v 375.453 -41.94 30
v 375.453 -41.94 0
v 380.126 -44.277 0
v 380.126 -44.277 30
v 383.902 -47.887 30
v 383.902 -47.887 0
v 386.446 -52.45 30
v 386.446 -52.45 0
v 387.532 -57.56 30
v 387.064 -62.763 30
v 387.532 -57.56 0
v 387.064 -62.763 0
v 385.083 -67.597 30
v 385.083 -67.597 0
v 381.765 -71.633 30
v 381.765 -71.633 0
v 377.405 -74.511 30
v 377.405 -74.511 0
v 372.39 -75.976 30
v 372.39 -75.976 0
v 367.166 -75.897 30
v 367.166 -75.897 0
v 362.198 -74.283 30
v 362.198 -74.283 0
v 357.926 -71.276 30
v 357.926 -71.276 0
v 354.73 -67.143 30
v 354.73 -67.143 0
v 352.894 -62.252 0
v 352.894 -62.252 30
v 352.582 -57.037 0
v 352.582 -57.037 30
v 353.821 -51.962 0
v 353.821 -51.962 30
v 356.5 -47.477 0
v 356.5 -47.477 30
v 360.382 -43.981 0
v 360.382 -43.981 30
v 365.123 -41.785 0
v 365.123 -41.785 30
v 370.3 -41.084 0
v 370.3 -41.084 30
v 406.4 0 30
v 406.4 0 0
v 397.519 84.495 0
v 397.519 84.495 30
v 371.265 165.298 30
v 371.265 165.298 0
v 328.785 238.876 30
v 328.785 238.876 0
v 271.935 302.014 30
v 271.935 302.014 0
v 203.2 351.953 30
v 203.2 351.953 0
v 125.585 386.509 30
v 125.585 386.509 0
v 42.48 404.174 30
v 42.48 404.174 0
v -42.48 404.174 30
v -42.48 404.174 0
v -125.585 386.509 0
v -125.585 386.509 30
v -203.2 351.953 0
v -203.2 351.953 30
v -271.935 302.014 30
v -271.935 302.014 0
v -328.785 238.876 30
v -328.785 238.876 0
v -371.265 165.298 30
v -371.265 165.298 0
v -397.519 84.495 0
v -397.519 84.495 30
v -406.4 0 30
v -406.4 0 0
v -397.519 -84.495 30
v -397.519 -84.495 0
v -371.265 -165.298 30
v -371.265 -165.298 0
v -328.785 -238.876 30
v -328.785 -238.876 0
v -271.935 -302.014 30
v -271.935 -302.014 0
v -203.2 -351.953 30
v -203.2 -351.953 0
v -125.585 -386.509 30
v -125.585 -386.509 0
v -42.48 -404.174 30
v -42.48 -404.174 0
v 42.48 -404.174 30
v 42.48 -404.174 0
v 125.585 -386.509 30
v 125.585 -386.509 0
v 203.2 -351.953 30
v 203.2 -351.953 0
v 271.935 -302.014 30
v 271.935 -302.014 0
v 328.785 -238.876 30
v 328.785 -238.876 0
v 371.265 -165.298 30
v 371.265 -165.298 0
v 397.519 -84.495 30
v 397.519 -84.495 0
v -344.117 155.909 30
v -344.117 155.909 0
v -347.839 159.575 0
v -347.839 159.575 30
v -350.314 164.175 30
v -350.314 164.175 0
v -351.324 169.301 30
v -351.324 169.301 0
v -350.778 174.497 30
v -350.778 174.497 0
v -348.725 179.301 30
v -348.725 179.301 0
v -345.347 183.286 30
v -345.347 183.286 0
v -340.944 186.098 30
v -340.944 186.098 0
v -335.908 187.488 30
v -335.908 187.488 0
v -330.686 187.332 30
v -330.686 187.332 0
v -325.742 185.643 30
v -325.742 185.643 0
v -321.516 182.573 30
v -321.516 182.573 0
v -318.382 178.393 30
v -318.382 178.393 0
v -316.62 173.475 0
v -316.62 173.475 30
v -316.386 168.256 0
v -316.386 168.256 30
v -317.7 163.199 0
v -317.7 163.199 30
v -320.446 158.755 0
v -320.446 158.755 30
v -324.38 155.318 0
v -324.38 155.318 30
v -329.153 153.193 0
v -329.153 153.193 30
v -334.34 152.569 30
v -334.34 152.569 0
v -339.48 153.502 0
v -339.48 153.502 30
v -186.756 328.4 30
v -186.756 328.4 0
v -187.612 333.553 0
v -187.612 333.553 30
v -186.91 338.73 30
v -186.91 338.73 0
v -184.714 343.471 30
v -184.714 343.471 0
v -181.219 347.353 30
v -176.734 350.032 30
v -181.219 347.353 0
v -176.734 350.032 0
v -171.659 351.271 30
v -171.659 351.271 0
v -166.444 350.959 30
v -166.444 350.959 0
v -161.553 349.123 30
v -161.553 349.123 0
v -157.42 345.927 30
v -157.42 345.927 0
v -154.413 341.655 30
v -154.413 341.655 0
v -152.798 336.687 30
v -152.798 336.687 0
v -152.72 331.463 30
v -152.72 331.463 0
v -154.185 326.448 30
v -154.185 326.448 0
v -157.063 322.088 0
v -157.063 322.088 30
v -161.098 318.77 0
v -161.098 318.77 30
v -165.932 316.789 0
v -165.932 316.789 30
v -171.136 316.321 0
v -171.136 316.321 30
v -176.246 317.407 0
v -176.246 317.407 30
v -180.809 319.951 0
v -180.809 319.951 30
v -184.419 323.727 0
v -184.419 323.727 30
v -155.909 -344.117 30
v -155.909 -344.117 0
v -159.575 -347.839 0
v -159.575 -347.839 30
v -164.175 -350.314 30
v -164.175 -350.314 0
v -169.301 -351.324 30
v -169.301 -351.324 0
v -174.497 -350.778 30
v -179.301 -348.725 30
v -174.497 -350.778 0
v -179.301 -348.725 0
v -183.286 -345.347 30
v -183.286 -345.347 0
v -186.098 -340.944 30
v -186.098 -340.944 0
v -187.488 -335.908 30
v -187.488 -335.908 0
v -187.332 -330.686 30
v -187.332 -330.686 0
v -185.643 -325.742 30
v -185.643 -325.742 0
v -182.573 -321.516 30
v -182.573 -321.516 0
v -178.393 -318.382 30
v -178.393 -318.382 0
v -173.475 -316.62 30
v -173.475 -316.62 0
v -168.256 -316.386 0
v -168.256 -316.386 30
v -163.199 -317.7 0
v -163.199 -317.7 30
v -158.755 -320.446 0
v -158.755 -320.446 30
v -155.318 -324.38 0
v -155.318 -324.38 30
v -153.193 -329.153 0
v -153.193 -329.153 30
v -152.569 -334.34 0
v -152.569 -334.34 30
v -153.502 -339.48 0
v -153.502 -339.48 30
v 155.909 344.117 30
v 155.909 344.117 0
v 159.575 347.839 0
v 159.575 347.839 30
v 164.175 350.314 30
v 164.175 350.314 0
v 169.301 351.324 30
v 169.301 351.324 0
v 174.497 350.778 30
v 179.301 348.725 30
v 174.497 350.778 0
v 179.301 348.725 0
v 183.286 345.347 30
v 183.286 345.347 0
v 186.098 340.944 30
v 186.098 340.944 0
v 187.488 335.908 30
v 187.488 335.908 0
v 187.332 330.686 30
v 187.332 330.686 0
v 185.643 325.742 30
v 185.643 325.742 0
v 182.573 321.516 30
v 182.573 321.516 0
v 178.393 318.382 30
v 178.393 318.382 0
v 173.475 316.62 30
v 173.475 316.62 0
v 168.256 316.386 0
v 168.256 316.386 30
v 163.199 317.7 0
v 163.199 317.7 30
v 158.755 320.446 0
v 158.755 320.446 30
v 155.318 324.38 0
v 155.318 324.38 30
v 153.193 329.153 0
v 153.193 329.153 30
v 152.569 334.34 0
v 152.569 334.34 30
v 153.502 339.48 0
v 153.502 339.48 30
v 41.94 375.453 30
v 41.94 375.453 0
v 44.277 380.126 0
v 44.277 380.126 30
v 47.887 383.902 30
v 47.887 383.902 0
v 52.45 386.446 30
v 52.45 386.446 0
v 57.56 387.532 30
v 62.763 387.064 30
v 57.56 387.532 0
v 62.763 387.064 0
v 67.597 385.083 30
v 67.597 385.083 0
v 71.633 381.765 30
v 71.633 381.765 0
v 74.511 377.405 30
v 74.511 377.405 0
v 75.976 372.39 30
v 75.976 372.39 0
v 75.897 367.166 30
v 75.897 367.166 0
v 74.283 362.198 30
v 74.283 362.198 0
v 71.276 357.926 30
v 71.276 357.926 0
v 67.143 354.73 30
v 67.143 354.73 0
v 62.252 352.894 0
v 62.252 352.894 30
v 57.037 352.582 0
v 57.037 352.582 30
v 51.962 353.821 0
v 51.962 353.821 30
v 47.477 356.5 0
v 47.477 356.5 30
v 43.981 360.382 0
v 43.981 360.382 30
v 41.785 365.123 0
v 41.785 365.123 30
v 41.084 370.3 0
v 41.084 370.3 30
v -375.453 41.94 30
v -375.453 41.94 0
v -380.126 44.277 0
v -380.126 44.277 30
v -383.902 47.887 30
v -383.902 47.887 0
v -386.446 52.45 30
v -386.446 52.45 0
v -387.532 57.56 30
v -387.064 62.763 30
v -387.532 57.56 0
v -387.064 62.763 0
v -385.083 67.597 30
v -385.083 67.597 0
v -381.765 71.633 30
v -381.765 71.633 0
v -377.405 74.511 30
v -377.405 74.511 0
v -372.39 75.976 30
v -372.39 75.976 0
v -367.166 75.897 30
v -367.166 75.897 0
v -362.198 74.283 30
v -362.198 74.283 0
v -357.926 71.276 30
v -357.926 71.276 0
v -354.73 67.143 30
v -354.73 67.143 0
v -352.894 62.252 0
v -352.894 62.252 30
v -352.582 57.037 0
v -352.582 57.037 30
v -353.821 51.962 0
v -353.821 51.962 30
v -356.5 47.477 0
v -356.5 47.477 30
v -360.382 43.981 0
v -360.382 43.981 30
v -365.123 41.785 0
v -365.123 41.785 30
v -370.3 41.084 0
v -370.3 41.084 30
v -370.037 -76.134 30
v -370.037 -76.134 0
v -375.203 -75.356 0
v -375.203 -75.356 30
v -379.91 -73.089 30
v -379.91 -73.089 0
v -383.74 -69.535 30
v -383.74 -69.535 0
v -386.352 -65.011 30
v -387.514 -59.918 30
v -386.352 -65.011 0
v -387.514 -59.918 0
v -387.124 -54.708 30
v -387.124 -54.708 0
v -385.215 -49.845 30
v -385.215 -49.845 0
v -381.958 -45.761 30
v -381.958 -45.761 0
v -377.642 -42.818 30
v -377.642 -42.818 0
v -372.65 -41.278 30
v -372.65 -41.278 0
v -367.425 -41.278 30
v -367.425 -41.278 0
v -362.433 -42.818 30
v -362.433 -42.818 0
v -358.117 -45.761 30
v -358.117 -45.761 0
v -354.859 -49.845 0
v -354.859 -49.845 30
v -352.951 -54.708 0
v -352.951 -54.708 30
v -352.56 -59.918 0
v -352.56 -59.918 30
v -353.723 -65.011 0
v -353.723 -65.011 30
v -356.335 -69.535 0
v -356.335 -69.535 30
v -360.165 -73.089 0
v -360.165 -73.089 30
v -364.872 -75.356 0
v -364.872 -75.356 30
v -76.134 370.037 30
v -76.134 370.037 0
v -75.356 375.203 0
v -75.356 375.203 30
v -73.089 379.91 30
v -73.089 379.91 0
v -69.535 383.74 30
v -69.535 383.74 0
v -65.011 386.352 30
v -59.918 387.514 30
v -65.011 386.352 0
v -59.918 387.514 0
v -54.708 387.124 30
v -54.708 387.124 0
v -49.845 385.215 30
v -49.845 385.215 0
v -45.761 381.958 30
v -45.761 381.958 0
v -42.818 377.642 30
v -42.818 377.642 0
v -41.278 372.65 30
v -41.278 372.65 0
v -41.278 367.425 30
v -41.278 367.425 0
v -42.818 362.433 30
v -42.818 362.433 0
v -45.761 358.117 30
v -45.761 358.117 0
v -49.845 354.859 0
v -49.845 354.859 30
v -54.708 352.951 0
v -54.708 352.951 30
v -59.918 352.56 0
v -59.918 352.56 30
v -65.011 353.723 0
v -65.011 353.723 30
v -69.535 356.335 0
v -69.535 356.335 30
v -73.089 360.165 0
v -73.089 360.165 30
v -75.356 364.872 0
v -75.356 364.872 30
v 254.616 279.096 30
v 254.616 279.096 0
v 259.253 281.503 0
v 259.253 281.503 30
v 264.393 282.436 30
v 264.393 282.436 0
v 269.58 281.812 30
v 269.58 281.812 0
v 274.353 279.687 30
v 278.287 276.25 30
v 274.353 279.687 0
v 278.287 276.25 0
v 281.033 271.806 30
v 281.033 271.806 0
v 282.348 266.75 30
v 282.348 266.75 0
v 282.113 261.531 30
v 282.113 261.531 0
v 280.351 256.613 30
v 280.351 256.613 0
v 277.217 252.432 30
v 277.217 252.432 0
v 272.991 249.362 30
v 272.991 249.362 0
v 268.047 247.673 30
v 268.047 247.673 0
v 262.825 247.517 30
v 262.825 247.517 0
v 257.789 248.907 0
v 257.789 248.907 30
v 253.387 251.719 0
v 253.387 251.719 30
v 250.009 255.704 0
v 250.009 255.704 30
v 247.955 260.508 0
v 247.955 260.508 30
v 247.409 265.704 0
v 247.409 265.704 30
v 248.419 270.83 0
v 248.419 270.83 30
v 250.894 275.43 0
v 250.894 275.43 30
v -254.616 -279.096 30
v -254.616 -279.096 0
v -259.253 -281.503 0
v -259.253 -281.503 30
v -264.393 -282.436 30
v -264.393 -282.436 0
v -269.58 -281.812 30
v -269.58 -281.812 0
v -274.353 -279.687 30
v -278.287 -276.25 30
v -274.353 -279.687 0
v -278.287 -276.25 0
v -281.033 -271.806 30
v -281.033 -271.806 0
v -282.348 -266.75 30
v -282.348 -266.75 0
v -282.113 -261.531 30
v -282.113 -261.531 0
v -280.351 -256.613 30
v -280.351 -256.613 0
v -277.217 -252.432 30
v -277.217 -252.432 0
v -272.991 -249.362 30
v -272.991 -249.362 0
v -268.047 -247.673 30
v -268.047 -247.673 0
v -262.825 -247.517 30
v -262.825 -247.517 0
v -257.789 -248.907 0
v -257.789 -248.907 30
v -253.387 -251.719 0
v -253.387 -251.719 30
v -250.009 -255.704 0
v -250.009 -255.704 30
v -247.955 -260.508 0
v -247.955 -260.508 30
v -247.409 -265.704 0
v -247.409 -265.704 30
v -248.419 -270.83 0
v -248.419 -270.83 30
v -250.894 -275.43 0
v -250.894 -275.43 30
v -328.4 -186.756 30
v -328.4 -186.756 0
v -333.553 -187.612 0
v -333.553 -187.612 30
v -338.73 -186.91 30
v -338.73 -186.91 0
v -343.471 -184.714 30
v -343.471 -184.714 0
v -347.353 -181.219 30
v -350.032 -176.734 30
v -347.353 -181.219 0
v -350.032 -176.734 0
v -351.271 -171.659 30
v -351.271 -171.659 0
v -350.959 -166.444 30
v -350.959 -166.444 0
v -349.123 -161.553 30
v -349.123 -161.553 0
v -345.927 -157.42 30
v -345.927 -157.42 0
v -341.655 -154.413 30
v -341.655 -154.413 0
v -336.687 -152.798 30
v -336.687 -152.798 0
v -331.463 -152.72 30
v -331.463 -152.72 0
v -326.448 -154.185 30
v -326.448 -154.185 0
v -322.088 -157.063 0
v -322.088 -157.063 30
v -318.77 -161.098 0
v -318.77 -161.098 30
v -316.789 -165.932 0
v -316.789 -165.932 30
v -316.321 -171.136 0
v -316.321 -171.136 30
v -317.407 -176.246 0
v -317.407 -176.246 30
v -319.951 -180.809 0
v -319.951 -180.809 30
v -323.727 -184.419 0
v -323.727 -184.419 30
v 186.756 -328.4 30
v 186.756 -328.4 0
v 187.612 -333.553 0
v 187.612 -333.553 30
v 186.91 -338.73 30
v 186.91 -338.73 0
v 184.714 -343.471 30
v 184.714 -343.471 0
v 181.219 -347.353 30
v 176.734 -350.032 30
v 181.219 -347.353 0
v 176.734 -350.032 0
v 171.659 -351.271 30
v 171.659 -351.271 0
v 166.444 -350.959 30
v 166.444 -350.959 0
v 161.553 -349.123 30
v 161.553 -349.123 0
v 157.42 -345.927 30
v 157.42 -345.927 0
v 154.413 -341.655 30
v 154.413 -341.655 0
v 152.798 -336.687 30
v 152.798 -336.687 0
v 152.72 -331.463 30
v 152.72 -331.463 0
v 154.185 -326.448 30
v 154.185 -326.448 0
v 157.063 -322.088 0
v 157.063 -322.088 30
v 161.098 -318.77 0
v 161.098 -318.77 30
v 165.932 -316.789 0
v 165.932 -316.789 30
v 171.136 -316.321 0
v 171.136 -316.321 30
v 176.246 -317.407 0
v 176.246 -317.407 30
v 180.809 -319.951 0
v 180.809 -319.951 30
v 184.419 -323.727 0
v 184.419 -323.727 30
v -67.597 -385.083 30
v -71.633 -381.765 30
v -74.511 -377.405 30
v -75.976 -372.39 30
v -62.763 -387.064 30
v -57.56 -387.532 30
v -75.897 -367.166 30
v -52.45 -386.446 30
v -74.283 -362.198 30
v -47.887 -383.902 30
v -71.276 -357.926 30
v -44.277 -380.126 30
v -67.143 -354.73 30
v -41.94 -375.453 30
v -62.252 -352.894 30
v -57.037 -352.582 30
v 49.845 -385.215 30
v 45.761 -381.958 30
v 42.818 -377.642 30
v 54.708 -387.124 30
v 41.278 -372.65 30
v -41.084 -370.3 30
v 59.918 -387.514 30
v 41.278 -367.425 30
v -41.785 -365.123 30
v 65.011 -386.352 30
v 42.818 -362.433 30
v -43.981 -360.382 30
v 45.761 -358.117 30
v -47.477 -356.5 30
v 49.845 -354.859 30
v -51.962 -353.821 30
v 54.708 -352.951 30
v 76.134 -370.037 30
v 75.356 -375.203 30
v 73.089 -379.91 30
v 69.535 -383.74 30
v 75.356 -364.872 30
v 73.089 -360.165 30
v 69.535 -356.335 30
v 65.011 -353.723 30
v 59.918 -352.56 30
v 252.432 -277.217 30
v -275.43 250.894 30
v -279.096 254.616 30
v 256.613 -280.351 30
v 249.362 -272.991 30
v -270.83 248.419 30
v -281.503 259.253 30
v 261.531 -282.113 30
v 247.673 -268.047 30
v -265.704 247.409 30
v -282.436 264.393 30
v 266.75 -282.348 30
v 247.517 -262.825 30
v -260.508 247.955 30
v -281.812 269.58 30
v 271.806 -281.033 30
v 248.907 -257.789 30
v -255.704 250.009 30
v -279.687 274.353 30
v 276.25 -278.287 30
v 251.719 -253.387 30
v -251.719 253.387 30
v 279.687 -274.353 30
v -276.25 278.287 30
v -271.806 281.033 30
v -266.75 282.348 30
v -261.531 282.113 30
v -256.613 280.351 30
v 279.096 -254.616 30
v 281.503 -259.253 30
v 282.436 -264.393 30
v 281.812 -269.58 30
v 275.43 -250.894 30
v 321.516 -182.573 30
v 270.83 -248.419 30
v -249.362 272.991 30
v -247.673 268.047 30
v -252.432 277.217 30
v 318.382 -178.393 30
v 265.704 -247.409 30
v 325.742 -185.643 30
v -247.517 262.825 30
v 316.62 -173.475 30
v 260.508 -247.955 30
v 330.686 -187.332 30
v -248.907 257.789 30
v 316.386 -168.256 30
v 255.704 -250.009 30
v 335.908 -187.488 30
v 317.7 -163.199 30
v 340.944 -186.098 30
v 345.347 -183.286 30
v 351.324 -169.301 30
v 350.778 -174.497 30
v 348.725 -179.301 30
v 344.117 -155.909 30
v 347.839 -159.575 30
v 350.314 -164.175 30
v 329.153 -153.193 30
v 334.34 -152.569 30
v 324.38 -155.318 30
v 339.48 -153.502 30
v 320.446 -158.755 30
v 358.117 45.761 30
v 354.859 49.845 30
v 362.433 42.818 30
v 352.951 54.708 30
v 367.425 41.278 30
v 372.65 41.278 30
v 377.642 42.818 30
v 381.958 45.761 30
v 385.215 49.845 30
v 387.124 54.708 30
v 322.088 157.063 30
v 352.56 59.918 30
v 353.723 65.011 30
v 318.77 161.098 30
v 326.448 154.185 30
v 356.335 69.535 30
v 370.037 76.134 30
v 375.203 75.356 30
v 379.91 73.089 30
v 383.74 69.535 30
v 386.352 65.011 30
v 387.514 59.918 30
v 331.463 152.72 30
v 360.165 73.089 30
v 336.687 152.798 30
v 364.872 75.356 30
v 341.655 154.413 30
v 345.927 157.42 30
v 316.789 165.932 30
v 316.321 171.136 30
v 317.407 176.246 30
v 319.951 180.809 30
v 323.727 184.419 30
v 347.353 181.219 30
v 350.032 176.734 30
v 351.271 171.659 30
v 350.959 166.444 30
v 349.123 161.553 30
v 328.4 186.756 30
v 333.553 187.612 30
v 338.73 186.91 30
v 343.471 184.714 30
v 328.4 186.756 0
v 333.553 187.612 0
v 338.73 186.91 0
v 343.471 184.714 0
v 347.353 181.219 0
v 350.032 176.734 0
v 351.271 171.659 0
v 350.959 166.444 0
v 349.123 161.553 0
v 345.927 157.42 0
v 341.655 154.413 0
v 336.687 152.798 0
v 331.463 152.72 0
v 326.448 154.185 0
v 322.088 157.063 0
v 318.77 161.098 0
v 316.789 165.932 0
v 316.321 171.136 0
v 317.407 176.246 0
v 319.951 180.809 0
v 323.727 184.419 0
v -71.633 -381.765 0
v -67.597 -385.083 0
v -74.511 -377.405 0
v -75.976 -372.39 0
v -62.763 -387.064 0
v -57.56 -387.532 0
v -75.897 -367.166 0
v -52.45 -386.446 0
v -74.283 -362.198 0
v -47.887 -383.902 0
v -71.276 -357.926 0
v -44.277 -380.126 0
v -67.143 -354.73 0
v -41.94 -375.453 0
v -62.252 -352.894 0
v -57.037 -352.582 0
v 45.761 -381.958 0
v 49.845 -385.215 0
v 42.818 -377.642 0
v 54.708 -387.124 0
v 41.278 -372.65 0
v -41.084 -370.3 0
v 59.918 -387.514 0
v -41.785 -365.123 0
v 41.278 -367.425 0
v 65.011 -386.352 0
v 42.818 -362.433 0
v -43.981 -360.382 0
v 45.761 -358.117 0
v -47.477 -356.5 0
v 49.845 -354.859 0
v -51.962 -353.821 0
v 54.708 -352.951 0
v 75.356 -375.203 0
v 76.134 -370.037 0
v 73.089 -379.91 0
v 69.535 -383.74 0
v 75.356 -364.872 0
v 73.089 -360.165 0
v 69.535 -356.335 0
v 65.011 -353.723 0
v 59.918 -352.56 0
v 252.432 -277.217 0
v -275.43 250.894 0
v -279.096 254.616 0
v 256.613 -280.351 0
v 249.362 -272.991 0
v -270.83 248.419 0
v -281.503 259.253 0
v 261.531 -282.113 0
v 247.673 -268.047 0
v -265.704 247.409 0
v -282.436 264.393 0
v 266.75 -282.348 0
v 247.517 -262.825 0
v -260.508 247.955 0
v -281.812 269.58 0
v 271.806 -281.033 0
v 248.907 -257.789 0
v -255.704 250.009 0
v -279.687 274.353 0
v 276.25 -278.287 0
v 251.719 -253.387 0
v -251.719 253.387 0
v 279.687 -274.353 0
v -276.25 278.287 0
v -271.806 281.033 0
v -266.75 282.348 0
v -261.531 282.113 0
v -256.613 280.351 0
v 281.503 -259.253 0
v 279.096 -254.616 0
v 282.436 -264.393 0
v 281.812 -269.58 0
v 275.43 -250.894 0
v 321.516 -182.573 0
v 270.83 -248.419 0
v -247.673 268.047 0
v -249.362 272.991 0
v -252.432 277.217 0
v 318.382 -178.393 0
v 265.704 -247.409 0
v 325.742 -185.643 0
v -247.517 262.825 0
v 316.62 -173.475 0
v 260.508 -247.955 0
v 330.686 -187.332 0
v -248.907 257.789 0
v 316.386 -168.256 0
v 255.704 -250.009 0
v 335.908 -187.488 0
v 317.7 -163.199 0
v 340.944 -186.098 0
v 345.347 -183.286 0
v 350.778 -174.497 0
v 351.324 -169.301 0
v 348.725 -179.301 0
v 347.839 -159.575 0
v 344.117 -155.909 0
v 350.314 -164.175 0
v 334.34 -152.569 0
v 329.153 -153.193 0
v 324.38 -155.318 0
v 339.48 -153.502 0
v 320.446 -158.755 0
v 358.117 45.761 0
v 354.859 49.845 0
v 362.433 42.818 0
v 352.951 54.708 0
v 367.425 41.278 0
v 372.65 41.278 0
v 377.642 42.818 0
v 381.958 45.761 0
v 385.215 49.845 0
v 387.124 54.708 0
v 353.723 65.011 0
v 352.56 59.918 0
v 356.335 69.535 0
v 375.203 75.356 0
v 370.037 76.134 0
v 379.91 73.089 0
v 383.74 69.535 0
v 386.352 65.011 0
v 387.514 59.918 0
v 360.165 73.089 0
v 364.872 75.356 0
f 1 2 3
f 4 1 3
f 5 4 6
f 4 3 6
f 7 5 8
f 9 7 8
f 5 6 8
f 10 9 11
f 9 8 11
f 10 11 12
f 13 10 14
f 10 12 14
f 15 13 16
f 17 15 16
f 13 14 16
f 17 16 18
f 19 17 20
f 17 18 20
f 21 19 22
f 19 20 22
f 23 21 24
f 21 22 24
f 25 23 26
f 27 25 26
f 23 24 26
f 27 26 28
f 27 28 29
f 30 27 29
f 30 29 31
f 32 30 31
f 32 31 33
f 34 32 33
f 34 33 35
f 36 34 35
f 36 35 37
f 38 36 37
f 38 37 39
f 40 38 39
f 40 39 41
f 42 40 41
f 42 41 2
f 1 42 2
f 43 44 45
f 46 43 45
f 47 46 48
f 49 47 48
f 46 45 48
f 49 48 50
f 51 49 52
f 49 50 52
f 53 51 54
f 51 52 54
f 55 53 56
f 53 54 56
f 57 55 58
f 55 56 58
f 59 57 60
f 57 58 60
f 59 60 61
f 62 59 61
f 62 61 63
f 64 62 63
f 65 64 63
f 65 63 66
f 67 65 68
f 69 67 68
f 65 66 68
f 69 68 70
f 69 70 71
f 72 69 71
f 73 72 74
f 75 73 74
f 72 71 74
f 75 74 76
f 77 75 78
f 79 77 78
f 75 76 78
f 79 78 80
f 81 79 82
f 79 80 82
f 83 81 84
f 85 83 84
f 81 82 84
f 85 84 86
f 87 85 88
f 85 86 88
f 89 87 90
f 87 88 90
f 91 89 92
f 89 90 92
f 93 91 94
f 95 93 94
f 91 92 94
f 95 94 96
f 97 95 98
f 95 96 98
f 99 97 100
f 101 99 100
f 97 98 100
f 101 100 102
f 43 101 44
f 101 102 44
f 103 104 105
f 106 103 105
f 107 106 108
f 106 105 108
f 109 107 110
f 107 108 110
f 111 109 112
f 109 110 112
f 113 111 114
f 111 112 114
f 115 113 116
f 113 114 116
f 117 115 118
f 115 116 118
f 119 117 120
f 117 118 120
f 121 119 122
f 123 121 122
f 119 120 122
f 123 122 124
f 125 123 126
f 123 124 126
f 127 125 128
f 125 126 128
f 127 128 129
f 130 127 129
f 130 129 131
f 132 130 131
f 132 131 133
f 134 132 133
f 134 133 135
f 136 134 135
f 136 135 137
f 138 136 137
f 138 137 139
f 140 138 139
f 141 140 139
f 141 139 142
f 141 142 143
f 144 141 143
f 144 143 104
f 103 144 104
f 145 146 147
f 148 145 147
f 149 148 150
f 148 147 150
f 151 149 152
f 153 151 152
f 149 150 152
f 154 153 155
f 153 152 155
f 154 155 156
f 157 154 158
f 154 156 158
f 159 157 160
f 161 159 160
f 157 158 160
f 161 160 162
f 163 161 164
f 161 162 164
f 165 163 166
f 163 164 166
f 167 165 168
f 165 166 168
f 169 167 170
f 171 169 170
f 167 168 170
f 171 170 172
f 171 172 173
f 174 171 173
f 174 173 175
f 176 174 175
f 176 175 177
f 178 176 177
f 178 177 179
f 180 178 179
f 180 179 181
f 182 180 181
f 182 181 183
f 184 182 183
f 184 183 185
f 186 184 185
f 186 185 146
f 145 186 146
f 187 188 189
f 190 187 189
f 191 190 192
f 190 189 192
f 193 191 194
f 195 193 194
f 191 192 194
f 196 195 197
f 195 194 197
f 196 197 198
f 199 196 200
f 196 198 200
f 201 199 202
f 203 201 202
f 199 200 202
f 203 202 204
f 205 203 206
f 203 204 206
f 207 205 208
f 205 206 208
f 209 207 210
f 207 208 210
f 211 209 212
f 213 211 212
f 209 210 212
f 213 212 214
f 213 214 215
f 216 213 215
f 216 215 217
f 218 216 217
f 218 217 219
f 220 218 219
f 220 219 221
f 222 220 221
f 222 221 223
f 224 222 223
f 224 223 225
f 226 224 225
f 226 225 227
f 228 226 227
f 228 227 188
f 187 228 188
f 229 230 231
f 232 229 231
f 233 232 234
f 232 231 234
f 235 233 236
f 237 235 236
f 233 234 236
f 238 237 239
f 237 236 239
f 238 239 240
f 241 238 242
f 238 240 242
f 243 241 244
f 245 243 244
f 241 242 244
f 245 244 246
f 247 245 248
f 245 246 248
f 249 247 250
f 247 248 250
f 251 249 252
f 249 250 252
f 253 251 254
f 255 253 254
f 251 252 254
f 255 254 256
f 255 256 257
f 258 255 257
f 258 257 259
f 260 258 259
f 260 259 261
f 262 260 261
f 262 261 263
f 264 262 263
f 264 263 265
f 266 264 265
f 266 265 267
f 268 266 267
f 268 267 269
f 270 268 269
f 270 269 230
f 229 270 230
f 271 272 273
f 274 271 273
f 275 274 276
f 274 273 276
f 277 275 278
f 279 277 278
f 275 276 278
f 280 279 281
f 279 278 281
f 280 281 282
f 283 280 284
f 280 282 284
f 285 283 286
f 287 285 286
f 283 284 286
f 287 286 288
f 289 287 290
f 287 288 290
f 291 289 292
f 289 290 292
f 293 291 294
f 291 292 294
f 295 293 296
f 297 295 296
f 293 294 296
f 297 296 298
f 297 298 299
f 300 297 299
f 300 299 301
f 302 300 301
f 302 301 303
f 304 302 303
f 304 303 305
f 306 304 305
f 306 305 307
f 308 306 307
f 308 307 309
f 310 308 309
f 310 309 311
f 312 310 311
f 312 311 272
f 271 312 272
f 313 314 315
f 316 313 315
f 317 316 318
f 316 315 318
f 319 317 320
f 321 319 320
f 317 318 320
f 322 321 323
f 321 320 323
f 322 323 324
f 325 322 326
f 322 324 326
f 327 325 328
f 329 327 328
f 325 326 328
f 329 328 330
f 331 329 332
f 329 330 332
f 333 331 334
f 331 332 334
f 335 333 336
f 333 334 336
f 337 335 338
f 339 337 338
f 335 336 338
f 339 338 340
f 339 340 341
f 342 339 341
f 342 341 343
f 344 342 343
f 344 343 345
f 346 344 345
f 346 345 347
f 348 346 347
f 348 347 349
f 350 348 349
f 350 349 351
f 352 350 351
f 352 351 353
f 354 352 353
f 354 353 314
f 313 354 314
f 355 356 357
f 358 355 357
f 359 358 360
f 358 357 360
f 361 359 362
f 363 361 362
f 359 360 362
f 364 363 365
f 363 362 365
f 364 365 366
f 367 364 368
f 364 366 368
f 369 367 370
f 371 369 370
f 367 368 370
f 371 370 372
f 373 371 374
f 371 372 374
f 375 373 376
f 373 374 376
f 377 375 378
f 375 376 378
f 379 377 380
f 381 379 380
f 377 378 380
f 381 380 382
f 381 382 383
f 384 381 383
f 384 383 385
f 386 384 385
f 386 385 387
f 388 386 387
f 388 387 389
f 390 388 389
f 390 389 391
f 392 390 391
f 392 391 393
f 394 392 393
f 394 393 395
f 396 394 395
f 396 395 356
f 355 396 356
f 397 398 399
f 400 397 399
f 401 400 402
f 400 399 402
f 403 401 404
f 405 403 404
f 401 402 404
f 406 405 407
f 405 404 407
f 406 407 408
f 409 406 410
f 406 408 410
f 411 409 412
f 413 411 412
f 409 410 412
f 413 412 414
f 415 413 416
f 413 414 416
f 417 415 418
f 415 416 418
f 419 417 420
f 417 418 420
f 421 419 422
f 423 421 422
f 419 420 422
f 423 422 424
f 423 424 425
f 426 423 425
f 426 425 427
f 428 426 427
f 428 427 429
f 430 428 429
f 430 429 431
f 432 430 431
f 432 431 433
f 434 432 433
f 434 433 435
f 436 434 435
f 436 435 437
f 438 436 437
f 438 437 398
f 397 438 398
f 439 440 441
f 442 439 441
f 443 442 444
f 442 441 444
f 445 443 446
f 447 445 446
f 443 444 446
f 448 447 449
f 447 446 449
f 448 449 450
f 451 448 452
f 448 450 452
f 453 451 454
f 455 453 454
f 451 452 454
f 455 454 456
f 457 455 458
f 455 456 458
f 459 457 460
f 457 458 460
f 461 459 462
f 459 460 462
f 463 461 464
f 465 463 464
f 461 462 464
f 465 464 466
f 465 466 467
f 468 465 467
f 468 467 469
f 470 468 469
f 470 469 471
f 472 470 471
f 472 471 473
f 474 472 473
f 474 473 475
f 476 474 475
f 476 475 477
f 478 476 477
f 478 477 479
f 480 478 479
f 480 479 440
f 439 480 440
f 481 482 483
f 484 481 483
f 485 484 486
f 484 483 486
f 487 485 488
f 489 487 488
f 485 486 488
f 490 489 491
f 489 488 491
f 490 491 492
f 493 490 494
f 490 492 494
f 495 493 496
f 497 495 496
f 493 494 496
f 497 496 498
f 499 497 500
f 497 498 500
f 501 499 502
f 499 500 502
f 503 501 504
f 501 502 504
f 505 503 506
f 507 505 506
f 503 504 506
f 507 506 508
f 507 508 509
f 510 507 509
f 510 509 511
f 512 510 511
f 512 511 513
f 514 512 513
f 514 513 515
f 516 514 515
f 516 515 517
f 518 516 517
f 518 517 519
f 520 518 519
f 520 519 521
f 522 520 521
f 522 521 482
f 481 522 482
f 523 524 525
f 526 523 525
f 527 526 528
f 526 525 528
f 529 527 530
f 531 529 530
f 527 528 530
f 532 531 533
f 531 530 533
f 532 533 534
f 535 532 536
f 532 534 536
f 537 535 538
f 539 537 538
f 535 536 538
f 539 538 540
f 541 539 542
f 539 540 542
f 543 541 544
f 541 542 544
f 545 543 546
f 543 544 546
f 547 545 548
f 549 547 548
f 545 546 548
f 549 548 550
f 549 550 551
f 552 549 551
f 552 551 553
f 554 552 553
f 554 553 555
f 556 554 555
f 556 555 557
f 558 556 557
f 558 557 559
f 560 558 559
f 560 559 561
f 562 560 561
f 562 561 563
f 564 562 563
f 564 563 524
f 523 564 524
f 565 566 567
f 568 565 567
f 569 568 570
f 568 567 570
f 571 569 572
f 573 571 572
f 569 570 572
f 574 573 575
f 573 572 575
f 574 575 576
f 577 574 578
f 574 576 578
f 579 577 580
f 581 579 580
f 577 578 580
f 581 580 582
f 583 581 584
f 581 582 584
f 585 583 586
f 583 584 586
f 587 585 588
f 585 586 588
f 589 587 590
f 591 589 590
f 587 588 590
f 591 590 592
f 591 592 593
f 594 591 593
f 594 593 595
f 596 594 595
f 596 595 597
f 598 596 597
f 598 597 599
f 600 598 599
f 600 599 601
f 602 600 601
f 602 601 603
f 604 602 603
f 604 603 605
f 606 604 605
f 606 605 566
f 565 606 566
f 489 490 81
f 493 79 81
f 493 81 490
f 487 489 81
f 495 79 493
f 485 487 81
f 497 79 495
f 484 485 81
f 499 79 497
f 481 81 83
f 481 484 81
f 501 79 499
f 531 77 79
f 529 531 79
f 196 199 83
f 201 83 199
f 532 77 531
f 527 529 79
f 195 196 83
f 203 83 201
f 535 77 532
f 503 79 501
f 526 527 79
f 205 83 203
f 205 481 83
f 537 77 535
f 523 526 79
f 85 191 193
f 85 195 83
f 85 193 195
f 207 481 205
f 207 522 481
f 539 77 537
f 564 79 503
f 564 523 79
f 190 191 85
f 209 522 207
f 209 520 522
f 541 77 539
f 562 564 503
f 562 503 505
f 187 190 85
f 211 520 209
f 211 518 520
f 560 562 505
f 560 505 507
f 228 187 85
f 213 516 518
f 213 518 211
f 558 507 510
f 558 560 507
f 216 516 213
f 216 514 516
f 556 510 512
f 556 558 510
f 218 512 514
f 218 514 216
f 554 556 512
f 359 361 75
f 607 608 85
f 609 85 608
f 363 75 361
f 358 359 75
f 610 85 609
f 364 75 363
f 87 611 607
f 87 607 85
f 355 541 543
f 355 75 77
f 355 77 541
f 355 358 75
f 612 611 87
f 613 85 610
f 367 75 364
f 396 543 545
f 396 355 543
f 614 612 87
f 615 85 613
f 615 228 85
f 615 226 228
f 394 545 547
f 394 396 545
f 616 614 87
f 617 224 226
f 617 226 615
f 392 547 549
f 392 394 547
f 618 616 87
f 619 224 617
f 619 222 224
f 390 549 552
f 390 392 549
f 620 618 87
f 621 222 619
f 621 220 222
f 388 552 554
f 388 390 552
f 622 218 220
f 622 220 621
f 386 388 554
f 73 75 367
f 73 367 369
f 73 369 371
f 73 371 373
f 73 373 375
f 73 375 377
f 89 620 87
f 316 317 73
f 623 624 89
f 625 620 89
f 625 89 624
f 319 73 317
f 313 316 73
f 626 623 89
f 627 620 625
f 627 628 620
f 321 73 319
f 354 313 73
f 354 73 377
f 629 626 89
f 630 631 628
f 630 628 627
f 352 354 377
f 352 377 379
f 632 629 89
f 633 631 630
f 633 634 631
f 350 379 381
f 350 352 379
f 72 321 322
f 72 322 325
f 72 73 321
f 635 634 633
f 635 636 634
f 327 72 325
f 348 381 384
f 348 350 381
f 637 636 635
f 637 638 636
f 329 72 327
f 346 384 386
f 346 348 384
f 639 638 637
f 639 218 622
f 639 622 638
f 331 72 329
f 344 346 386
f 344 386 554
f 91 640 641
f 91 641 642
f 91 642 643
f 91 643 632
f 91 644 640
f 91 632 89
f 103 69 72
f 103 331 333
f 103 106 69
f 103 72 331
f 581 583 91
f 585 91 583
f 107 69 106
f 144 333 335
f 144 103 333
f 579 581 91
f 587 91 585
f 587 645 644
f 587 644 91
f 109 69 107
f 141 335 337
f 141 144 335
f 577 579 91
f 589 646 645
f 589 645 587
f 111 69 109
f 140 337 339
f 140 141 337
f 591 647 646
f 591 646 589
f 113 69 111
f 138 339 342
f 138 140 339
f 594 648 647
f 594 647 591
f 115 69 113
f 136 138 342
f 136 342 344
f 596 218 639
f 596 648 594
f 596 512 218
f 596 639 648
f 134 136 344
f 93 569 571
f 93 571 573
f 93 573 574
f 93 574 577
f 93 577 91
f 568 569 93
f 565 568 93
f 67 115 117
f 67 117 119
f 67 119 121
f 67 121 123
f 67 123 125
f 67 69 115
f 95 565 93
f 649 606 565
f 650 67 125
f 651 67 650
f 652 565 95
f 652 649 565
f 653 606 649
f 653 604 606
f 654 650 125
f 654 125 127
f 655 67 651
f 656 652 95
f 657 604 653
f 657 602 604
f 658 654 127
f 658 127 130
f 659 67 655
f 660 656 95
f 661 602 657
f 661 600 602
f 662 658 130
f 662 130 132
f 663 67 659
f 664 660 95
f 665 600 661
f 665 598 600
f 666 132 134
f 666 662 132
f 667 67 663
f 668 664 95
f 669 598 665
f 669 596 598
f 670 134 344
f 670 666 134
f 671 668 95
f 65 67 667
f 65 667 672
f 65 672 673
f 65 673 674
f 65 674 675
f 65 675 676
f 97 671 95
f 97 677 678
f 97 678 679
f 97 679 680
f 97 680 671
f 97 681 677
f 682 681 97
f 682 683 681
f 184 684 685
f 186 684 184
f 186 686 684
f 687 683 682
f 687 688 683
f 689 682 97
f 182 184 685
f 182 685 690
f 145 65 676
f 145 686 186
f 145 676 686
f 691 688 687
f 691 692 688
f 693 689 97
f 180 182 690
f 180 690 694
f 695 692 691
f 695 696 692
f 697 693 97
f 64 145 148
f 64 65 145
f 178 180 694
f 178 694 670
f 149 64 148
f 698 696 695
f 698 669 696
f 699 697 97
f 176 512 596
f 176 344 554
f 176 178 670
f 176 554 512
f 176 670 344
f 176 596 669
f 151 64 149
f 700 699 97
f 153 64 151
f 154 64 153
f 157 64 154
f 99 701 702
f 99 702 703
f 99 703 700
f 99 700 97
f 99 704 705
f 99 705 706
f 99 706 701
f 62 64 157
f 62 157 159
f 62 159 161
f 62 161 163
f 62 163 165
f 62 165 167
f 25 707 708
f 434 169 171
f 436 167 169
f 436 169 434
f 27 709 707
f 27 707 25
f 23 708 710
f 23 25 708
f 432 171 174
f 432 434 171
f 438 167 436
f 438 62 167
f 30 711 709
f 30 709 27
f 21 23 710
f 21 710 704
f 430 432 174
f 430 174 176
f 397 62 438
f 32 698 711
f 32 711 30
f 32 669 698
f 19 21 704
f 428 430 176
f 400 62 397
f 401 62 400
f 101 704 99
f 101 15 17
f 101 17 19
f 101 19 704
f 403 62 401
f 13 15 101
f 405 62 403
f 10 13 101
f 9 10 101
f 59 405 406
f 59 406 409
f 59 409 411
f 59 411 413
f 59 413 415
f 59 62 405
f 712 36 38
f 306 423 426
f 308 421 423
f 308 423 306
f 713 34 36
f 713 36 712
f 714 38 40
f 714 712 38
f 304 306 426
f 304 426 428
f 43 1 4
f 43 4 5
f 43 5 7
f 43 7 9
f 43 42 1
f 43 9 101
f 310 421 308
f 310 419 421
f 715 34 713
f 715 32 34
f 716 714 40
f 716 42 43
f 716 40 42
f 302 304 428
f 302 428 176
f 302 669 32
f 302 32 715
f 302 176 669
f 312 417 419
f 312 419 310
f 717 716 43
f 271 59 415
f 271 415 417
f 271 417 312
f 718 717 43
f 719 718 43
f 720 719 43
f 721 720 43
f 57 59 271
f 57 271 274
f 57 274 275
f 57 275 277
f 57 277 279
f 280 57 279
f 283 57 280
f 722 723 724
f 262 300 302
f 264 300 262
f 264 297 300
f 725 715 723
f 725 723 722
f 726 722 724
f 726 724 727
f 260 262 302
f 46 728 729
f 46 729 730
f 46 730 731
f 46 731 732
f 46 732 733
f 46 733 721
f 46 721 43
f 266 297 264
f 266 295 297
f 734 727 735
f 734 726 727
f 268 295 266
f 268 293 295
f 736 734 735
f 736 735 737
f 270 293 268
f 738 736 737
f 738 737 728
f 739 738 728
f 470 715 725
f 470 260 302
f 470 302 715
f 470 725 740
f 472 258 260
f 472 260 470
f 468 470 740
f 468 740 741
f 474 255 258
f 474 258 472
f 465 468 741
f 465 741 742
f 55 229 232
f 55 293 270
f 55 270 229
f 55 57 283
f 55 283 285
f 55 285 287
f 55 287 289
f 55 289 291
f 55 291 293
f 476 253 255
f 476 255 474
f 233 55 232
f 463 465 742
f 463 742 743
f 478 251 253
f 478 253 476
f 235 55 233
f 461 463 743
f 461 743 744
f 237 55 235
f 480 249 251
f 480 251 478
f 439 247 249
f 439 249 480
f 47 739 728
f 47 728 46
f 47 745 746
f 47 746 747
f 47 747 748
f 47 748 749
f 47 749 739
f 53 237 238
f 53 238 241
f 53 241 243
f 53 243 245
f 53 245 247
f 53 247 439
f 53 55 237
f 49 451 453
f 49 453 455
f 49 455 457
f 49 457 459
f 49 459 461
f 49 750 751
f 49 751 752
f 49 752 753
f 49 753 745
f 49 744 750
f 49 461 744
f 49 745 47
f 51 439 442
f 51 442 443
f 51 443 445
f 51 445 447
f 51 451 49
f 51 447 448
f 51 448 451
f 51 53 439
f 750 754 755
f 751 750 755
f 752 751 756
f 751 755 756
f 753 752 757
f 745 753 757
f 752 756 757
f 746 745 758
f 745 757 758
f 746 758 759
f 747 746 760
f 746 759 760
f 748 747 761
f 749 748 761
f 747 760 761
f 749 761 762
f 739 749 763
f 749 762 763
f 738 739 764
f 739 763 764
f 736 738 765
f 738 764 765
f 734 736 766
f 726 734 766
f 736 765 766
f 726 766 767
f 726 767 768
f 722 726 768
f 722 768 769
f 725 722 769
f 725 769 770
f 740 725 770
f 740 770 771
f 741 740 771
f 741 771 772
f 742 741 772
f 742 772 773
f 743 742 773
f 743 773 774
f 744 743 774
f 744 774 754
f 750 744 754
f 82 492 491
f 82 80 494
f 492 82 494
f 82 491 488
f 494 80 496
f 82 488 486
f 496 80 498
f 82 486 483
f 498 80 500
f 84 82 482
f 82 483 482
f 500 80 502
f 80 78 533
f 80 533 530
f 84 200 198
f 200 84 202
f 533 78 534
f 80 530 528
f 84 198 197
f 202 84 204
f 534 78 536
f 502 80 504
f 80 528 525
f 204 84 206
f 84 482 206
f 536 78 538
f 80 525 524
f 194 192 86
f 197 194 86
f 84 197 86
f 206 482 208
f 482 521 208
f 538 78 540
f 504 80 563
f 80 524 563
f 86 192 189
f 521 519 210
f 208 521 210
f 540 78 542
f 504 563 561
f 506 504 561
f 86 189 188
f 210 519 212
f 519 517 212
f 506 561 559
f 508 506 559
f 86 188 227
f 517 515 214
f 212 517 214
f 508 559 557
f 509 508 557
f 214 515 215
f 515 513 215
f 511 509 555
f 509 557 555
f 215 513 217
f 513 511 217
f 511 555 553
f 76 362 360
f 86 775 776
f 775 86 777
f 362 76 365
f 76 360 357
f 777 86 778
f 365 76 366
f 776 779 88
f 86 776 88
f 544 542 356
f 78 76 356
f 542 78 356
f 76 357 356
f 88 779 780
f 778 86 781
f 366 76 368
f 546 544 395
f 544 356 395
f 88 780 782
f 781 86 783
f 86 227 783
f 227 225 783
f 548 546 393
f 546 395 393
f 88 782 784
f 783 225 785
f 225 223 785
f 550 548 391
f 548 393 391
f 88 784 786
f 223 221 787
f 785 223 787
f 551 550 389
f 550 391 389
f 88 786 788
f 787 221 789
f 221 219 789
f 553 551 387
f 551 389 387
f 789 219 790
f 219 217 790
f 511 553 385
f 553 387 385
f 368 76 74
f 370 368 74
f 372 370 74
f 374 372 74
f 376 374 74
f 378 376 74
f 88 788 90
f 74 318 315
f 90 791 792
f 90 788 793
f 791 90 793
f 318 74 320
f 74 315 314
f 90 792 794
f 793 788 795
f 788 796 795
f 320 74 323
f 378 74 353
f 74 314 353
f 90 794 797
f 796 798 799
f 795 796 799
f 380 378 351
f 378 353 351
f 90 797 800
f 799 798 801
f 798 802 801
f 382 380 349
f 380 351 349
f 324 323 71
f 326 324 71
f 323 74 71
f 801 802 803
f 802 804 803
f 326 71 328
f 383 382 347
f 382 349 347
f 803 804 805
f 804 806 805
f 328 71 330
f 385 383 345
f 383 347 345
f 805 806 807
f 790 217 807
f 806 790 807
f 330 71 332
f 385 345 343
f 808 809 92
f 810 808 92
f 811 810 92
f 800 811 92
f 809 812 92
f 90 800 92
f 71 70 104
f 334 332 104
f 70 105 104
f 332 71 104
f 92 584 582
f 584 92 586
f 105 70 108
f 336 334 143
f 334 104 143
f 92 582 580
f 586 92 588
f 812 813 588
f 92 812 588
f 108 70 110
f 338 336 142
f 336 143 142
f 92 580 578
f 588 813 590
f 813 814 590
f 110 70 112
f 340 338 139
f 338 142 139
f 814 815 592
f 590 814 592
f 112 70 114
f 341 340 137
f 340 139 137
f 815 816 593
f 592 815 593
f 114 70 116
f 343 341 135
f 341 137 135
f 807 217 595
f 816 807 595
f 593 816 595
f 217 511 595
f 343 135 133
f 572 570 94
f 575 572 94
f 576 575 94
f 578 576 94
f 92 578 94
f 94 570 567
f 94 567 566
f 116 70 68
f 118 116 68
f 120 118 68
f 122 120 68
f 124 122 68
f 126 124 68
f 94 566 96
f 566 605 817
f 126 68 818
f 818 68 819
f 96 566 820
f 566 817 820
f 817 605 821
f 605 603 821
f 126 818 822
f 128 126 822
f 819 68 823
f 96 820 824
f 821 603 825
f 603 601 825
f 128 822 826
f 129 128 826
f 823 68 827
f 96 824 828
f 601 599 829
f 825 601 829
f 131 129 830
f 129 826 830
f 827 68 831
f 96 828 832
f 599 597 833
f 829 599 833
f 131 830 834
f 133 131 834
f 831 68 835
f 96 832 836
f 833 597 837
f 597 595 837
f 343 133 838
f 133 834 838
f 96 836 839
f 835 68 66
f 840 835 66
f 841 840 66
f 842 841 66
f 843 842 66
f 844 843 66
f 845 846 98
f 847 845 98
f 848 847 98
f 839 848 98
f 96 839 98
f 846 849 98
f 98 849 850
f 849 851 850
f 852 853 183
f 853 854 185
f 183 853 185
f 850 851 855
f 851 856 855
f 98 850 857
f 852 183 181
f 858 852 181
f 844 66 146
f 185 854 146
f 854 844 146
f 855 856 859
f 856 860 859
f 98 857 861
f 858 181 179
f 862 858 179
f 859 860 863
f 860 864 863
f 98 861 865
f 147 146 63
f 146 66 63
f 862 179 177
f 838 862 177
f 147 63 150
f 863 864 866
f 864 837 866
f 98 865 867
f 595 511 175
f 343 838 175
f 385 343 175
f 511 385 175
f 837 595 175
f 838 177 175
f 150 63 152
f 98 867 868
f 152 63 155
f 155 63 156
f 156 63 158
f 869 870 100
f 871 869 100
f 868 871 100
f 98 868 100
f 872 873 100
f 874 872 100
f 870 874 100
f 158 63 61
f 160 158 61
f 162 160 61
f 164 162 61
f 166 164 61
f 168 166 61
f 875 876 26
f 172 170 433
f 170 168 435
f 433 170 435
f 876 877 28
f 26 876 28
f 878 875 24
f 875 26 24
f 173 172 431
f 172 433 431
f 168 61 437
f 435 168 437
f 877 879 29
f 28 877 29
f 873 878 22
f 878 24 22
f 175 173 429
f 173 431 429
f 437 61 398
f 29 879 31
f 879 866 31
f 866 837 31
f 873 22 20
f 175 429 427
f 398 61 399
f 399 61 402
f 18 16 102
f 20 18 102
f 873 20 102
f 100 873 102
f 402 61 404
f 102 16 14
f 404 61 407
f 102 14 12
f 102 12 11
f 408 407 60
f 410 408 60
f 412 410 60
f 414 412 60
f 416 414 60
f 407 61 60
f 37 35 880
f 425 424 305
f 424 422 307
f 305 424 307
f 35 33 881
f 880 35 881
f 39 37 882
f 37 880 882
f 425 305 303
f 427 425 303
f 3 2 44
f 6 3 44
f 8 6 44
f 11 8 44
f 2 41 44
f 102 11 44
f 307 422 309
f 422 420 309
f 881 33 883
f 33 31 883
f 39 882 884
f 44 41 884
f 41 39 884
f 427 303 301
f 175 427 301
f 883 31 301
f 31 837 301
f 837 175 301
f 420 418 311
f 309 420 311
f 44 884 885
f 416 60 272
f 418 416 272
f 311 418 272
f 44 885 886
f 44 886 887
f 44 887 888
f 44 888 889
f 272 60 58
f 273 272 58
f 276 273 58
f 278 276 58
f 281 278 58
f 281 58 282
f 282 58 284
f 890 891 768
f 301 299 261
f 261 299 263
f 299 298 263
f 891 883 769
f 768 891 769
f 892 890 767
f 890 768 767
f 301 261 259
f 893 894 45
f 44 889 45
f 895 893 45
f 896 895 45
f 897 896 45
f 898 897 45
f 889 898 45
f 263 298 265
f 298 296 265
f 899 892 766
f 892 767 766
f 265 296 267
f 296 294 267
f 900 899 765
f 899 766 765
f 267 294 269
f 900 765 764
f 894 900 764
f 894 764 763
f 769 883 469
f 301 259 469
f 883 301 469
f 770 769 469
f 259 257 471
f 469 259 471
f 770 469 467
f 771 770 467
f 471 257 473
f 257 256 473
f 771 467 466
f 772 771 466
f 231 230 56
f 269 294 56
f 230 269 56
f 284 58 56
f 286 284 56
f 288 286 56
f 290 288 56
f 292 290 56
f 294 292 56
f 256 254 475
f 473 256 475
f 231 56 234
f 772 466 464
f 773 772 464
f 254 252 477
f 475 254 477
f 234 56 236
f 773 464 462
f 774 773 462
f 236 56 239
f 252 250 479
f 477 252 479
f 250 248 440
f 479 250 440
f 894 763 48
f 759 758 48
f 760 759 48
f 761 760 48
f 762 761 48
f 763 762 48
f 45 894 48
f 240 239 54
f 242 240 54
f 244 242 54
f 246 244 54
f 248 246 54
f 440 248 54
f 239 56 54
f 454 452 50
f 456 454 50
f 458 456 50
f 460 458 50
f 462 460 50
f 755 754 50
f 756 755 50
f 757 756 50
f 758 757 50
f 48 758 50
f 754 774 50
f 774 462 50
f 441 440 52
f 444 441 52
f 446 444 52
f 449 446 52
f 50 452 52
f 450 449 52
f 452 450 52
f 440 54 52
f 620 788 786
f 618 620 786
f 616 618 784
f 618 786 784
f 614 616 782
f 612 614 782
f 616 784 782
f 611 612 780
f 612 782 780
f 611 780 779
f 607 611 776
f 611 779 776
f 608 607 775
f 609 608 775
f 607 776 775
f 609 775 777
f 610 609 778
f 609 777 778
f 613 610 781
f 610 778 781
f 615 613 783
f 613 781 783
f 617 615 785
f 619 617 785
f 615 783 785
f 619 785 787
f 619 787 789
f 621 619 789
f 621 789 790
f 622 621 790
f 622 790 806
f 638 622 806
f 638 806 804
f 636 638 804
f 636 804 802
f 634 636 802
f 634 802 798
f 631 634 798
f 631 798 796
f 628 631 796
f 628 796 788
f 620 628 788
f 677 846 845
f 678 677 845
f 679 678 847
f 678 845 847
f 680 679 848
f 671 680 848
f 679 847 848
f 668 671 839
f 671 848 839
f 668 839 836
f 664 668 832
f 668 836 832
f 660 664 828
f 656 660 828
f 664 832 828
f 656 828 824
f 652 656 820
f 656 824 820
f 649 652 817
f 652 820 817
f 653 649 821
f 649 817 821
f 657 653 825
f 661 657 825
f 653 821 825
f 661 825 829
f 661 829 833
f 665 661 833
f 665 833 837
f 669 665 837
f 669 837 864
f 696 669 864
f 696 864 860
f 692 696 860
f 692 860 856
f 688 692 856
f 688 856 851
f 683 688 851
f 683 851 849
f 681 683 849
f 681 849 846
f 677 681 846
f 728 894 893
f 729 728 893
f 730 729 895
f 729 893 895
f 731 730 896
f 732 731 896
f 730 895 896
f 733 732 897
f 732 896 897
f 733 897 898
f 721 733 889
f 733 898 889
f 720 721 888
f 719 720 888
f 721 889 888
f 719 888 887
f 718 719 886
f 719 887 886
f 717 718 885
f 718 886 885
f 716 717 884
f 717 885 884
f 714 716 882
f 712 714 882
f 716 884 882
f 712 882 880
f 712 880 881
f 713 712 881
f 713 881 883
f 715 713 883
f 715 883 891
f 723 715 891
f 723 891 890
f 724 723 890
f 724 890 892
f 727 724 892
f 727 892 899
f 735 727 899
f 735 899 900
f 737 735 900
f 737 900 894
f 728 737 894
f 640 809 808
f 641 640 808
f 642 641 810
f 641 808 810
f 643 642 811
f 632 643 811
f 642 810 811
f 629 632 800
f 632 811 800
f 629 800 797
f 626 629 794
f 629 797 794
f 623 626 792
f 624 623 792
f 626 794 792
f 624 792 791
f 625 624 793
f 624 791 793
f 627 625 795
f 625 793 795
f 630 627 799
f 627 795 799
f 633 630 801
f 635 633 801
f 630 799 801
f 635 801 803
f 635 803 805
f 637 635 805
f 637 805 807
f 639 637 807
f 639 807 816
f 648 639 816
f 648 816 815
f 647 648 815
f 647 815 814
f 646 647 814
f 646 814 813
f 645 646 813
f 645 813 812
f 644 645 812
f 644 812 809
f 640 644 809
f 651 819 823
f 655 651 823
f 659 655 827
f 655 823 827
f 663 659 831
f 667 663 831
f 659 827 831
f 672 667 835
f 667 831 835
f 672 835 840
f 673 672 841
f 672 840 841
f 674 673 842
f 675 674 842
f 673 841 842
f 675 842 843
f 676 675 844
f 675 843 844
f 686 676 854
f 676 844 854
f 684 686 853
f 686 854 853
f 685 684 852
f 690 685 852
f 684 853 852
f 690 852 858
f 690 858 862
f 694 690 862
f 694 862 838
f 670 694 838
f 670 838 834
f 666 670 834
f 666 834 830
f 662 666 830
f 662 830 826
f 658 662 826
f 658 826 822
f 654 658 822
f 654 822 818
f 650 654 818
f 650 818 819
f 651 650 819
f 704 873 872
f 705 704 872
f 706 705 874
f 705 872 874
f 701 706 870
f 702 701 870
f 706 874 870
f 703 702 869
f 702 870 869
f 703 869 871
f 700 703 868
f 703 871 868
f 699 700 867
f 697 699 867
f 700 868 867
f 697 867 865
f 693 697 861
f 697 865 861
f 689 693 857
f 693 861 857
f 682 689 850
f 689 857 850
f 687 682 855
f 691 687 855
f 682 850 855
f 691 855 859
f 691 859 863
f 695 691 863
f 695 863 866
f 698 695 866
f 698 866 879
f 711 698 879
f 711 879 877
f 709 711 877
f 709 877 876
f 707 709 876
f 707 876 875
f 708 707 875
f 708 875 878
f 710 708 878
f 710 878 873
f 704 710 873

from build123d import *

# Parameters (mm, degrees)
SKETCH1_R          = 406.4
EXTRUDE1_DEPTH     = 30
SKETCH2_R          = 17.526
CUT_EXTRUDE1_DEPTH = 31
CIRPATTERN1_COUNT  = 20


with BuildPart() as part:
    # Sketch1 → Extrude1 (new body)
    with BuildSketch(Plane.XY):
        Circle(SKETCH1_R)
    extrude(amount=EXTRUDE1_DEPTH)

    # Sketch2 → Cut-Extrude1 (cut, through all)
    with BuildSketch(Plane(origin=(0, 0, 0), x_dir=(-1, 0, 0), z_dir=(0, 0, -1))):
        with Locations((58.608172327, 370.037436804)):
            Circle(SKETCH2_R)
    cut_extrude1 = extrude(amount=-CUT_EXTRUDE1_DEPTH, mode=Mode.SUBTRACT)

    # CirPattern1: Cut-Extrude1 ×20 about axis
    cirpattern1_axis = Axis((0, 0, 0), (0, 0, 1))
    for i in range(1, CIRPATTERN1_COUNT):
        add(cut_extrude1.rotate(cirpattern1_axis, i * 360 / CIRPATTERN1_COUNT), mode=Mode.SUBTRACT)


solid = part.part
